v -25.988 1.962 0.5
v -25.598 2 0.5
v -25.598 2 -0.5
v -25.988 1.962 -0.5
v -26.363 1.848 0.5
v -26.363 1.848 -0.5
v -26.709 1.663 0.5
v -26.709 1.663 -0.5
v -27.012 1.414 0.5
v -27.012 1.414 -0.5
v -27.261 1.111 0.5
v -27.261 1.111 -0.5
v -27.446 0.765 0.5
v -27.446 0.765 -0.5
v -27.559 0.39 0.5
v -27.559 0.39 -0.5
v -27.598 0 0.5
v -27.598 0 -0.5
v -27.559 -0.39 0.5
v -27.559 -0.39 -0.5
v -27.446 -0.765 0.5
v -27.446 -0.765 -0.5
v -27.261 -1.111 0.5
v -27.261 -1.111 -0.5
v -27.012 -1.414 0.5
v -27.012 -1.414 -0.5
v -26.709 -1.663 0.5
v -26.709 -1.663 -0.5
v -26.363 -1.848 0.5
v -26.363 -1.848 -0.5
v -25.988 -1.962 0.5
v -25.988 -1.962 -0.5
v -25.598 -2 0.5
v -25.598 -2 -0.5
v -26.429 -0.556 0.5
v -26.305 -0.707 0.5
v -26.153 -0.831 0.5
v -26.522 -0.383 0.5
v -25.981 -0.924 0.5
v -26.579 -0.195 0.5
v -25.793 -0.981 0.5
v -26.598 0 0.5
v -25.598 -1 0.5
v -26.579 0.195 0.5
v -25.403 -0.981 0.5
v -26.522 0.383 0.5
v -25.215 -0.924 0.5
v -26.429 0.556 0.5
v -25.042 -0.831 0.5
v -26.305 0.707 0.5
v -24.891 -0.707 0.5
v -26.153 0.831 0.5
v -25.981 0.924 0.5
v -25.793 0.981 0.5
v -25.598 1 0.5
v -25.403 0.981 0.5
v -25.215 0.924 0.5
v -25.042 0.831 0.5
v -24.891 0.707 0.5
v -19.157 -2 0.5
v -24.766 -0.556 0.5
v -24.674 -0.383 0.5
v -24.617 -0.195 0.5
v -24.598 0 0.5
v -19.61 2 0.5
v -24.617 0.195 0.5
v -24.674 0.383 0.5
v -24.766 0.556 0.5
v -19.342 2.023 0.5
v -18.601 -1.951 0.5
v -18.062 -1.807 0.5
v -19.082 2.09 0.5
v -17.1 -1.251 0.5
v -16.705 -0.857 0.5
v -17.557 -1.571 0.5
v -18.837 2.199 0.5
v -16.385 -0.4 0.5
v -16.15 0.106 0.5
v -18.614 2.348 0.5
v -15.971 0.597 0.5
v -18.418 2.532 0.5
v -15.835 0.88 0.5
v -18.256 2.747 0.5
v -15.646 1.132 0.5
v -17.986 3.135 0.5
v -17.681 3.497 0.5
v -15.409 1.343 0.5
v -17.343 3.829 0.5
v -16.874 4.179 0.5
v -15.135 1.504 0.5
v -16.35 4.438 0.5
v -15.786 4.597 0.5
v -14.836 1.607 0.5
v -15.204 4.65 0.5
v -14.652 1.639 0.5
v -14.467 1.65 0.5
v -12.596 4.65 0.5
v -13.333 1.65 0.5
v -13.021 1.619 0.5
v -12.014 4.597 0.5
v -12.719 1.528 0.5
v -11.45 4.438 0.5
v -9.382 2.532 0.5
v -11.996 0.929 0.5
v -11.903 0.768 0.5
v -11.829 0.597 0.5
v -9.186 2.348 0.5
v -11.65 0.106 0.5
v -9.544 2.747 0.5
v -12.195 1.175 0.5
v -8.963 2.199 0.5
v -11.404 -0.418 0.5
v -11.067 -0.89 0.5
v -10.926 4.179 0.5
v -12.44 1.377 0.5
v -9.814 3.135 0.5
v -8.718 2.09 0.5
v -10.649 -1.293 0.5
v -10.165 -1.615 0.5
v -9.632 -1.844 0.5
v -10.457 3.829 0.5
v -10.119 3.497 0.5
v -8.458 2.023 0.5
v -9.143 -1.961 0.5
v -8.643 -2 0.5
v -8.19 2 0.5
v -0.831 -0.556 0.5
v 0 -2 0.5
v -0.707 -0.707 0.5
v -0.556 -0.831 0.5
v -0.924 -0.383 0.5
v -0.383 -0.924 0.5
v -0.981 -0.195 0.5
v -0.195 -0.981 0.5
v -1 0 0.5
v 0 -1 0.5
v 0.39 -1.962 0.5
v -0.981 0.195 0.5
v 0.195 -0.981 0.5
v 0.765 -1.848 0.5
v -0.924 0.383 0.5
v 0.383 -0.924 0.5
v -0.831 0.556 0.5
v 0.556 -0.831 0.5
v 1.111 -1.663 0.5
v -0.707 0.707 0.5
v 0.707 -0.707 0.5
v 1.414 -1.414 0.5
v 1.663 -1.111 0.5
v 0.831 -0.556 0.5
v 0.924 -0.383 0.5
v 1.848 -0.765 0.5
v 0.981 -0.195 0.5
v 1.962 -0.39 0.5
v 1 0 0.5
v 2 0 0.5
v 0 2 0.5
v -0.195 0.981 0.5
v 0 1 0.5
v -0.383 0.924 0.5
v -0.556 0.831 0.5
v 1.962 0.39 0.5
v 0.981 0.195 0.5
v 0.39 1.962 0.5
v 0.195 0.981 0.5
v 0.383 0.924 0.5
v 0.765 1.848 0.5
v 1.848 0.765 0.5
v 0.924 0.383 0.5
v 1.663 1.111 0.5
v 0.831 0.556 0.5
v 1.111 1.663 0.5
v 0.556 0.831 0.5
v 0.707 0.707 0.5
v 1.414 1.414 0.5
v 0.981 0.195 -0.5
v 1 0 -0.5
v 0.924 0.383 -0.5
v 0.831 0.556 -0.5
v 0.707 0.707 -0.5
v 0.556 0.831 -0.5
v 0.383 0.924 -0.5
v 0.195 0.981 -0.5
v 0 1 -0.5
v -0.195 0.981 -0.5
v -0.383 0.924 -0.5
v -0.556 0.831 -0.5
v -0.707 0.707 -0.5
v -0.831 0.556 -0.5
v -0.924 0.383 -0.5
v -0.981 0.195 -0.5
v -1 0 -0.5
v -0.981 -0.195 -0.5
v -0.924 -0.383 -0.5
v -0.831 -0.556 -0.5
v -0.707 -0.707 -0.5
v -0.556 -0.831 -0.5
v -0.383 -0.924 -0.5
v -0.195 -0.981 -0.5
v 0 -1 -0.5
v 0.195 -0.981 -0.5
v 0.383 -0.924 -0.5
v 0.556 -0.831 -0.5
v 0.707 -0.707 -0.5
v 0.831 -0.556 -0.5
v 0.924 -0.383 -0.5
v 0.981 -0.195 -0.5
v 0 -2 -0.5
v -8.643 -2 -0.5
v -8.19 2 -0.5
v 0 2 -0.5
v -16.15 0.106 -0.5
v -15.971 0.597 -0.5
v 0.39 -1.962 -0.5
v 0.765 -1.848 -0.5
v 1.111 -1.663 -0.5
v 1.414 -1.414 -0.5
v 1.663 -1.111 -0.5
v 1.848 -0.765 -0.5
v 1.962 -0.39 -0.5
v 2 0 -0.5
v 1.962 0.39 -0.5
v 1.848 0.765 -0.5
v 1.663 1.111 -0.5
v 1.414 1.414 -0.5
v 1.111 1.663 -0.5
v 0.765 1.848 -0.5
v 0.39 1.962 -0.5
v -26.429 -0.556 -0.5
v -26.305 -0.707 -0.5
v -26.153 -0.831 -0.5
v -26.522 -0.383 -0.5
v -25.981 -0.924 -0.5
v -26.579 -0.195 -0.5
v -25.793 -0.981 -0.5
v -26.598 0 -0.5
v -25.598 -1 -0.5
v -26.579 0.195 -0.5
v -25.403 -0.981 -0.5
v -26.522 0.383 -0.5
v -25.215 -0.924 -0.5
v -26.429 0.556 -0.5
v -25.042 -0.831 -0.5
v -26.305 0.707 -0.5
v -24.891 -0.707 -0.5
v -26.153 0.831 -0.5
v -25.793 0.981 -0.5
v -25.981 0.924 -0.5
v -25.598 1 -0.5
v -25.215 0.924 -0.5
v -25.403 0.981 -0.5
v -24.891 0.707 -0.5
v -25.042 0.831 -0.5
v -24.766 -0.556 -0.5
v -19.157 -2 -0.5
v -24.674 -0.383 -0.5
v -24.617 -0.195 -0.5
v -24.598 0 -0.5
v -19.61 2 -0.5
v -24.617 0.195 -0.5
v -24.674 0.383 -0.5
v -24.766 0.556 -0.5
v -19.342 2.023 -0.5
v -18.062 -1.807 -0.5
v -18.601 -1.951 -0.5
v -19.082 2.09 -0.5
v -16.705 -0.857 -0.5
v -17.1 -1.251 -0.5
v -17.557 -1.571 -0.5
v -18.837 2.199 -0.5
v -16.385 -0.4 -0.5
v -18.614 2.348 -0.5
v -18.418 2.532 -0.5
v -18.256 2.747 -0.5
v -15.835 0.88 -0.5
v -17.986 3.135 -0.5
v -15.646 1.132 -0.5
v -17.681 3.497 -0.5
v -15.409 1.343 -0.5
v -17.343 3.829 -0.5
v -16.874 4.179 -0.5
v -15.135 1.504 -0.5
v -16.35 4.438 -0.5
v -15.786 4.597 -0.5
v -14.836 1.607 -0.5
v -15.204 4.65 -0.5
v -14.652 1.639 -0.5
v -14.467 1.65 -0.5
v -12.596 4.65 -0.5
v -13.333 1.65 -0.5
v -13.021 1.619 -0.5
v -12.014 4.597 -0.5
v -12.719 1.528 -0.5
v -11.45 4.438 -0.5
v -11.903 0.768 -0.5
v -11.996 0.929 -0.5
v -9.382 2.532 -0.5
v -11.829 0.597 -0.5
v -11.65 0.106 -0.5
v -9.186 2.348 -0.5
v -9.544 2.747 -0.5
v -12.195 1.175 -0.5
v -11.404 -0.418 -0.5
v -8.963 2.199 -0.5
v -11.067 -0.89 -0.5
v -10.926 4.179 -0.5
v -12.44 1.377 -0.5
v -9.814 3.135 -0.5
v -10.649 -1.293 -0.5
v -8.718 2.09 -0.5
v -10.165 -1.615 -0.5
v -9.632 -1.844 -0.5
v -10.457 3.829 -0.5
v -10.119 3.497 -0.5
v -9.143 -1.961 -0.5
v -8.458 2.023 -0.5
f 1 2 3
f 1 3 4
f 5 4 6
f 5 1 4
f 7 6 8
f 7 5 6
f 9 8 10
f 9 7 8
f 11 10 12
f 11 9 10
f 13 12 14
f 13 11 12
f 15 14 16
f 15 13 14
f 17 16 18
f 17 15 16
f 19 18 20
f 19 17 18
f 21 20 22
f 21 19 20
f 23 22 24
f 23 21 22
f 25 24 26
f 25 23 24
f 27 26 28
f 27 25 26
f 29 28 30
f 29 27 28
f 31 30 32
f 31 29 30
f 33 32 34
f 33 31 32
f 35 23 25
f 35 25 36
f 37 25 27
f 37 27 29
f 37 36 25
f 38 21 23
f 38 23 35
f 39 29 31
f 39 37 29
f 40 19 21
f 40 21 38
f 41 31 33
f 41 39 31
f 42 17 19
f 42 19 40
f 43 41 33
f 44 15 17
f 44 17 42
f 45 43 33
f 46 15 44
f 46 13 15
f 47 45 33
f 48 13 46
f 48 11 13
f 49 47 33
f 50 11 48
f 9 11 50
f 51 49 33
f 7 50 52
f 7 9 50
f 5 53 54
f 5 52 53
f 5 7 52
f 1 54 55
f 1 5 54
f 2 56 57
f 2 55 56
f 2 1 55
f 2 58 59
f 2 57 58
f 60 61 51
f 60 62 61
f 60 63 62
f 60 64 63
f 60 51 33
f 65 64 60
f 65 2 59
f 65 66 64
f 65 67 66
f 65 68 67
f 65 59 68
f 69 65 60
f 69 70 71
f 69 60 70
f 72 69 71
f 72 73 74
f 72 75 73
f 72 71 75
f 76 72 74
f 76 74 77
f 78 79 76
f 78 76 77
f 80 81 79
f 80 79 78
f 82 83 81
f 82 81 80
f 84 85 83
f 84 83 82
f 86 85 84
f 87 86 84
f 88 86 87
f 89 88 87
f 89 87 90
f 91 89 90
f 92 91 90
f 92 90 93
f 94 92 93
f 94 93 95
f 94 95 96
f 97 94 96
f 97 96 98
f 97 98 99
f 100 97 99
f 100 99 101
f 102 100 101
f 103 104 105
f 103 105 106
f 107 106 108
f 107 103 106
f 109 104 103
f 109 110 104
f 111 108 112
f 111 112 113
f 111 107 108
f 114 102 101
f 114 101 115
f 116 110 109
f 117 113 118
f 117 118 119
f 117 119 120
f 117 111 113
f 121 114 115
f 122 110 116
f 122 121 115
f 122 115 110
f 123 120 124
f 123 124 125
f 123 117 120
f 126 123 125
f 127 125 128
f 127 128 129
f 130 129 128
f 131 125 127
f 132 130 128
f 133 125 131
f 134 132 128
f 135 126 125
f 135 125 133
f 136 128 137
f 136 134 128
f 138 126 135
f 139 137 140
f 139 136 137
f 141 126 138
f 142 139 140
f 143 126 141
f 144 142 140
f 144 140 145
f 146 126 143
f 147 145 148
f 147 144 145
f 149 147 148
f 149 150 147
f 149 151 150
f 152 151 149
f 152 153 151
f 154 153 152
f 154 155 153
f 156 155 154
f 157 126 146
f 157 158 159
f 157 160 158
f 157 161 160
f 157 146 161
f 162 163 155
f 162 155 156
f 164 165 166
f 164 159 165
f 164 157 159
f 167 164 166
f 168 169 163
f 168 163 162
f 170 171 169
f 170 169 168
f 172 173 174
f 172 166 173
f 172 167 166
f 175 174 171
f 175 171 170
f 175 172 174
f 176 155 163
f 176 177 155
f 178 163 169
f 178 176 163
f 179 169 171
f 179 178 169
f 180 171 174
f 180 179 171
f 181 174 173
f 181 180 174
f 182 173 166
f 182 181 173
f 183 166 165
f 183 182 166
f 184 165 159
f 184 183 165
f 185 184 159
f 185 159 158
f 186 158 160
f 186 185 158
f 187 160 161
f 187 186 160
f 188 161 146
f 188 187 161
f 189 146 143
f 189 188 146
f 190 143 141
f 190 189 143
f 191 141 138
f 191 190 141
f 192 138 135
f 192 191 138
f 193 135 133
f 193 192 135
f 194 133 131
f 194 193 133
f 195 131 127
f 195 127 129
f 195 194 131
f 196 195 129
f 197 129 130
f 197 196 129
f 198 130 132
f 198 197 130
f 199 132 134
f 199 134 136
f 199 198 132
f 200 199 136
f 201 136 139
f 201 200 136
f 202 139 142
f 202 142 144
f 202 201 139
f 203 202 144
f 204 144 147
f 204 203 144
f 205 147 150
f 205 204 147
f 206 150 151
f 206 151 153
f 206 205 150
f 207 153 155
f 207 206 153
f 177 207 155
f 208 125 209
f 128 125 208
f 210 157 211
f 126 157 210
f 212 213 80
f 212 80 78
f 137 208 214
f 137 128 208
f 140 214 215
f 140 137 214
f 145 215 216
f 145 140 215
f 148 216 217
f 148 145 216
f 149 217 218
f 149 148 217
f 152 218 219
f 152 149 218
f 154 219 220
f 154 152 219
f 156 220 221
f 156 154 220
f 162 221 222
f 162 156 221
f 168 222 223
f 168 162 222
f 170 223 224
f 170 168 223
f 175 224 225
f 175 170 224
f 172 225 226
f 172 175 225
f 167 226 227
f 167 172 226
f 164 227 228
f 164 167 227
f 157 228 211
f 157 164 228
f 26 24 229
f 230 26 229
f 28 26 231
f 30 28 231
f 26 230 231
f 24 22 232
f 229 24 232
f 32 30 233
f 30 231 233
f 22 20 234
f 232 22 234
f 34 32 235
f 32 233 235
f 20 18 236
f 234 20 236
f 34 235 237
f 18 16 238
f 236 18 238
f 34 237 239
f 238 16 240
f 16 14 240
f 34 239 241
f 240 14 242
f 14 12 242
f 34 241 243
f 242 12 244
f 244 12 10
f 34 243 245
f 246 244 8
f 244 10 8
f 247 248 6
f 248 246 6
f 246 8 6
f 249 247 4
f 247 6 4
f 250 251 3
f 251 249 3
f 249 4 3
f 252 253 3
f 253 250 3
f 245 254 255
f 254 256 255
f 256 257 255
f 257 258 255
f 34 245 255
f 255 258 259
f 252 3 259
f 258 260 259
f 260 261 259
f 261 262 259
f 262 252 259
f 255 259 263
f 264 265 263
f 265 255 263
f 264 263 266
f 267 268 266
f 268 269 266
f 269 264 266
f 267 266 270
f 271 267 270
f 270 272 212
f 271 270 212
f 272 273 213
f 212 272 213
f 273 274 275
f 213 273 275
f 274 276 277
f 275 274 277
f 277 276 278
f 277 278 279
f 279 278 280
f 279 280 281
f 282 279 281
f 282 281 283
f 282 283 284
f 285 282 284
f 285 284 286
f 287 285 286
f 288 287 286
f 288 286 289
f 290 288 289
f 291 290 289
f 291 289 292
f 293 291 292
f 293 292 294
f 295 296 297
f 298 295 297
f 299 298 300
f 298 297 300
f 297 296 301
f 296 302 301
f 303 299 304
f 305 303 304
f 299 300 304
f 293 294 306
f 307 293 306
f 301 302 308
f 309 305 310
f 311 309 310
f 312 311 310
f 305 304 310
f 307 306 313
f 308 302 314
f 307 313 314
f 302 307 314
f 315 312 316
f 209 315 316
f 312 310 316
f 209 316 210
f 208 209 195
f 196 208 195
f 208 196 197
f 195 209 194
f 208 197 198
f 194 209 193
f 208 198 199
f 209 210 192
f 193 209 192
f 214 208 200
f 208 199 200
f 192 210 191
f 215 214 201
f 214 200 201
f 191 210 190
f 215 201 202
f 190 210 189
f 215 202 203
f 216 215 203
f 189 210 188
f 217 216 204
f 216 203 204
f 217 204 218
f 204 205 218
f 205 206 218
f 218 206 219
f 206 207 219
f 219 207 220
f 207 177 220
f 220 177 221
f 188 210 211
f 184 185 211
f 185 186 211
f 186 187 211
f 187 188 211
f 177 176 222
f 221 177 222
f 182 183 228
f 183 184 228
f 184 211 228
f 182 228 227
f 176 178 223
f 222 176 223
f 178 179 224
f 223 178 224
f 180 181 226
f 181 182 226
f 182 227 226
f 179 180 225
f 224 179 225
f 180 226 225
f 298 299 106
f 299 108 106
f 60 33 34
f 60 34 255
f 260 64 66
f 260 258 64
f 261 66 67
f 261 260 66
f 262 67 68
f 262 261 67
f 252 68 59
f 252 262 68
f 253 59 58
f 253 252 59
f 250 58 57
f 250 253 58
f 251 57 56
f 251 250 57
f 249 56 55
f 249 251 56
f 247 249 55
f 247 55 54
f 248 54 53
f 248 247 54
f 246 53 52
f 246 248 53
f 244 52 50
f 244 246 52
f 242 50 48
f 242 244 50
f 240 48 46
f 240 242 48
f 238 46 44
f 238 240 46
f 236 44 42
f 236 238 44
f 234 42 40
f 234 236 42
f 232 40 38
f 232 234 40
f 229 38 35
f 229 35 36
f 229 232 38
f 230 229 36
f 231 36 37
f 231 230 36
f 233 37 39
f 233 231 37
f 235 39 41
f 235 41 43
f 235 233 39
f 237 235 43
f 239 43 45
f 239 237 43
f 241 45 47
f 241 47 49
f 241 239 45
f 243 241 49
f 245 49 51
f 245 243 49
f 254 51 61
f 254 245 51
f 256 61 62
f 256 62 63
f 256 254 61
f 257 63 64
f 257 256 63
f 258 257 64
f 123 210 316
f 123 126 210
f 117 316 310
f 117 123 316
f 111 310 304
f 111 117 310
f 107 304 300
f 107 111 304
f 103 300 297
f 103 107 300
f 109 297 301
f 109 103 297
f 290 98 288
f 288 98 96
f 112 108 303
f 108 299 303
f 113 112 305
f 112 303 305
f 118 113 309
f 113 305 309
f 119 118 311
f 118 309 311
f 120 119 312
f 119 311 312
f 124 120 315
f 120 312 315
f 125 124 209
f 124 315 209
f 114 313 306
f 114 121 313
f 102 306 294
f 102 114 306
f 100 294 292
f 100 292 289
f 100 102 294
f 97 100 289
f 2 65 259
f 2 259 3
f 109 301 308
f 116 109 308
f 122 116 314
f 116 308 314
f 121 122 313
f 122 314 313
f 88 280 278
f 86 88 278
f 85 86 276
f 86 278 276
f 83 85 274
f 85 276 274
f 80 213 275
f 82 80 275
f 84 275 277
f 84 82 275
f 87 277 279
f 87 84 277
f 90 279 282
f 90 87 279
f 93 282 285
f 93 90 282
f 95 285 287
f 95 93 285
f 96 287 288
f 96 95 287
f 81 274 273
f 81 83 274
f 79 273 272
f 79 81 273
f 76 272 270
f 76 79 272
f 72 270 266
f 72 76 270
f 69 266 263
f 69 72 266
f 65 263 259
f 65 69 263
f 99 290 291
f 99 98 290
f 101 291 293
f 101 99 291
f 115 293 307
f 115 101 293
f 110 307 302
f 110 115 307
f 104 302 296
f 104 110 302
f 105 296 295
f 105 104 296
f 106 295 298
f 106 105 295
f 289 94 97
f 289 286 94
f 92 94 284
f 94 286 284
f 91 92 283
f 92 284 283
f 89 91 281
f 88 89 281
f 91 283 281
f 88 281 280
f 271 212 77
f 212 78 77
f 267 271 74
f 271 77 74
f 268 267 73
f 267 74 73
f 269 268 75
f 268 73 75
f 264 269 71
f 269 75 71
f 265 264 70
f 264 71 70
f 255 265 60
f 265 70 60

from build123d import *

# Parameters (mm, degrees)
SKETCH_1_R      = 1
EXTRUDE_1_DEPTH = 0.5
EXTRUDE1_DEPTH  = 0.5
EXTRUDE2_DEPTH  = 0.5
FILLET2_R       = 1.6
FILLET3_R       = 3.2


with BuildPart() as part:
    # Эскиз1 → Бобышка-Вытянуть1 (new, symmetric)
    with BuildSketch(Plane.XY):
        with BuildLine():
            Line((0, 2), (-25.5979, 2))
            ThreePointArc((-25.5979, 2), (-27.5979, 0), (-25.5979, -2))
            Line((-25.5979, -2), (0, -2))
            ThreePointArc((0, -2), (2, 0), (0, 2))
        make_face()
        with Locations((-25.5979, 0)):
            Circle(SKETCH_1_R, mode=Mode.SUBTRACT)
        Circle(SKETCH_1_R, mode=Mode.SUBTRACT)
    extrude(amount=EXTRUDE_1_DEPTH, both=True)

    # Sketch2 → Extrude1 (add, symmetric)
    with BuildSketch(Plane.XY):
        with BuildLine():
            Line((-13.9, 0), (-11.75, 0))
            ThreePointArc((-11.75, 0), (-11.782663331, 0.373343582), (-11.879660865, 0.735343308))
            Line((-11.879660865, 0.735343308), (-11.612017789, 0))
            Line((-11.612017789, 0), (-8.75, 0))
            ThreePointArc((-8.75, 0), (-14.920219052, 5.047935527), (-18.645787606, -2))
            Line((-18.645787606, -2), (-16.915922679, -2))
            Line((-16.915922679, -2), (-15.920339135, 0.735343308))
            ThreePointArc((-15.920339135, 0.735343308), (-15.860511069, -0.882551045), (-14.688986692, -2))
            Line((-14.688986692, -2), (-13.9, -2))
            Line((-13.9, -2), (-13.9, 0))
        make_face()
    extrude(amount=EXTRUDE1_DEPTH, both=True)

    # Sketch → Extrude2 (cut, symmetric)
    with BuildSketch(Plane.XY):
        with BuildLine():
            Line((-10.884077321, -2), (-11.879660865, 0.735343308))
            ThreePointArc((-11.879660865, 0.735343308), (-12.140166364, 1.235105491), (-12.521595125, 1.65))
            Line((-12.521595125, 1.65), (-15.278404875, 1.65))
            ThreePointArc((-15.278404875, 1.65), (-15.659833636, 1.235105491), (-15.920339135, 0.735343308))
            Line((-15.920339135, 0.735343308), (-16.915922679, -2))
            Line((-16.915922679, -2), (-10.884077321, -2))
        make_face()
        with BuildLine():
            ThreePointArc((-11.686405638, 4.65), (-13.9, 5.15), (-16.113594362, 4.65))
            Line((-16.113594362, 4.65), (-11.686405638, 4.65))
        make_face()
    extrude(amount=EXTRUDE2_DEPTH, both=True, mode=Mode.SUBTRACT)

    # Fillet2
    fillet2_edges = [part.edges().sort_by_distance(p)[0] for p in [
        (-9.154212394, 2, 0),
        (-18.645787606, 2, 0),
        (-12.521595125, 1.65, 0),
        (-15.278404875, 1.65, 0),
    ]]
    fillet(fillet2_edges, radius=FILLET2_R)

    # Fillet3
    fillet3_edges = [part.edges().sort_by_distance(p)[0] for p in [
        (-10.884077321, -2, 0),
        (-16.915922679, -2, 0),
        (-11.686405638, 4.65, 0),
        (-16.113594362, 4.65, 0),
    ]]
    fillet(fillet3_edges, radius=FILLET3_R)


solid = part.part
